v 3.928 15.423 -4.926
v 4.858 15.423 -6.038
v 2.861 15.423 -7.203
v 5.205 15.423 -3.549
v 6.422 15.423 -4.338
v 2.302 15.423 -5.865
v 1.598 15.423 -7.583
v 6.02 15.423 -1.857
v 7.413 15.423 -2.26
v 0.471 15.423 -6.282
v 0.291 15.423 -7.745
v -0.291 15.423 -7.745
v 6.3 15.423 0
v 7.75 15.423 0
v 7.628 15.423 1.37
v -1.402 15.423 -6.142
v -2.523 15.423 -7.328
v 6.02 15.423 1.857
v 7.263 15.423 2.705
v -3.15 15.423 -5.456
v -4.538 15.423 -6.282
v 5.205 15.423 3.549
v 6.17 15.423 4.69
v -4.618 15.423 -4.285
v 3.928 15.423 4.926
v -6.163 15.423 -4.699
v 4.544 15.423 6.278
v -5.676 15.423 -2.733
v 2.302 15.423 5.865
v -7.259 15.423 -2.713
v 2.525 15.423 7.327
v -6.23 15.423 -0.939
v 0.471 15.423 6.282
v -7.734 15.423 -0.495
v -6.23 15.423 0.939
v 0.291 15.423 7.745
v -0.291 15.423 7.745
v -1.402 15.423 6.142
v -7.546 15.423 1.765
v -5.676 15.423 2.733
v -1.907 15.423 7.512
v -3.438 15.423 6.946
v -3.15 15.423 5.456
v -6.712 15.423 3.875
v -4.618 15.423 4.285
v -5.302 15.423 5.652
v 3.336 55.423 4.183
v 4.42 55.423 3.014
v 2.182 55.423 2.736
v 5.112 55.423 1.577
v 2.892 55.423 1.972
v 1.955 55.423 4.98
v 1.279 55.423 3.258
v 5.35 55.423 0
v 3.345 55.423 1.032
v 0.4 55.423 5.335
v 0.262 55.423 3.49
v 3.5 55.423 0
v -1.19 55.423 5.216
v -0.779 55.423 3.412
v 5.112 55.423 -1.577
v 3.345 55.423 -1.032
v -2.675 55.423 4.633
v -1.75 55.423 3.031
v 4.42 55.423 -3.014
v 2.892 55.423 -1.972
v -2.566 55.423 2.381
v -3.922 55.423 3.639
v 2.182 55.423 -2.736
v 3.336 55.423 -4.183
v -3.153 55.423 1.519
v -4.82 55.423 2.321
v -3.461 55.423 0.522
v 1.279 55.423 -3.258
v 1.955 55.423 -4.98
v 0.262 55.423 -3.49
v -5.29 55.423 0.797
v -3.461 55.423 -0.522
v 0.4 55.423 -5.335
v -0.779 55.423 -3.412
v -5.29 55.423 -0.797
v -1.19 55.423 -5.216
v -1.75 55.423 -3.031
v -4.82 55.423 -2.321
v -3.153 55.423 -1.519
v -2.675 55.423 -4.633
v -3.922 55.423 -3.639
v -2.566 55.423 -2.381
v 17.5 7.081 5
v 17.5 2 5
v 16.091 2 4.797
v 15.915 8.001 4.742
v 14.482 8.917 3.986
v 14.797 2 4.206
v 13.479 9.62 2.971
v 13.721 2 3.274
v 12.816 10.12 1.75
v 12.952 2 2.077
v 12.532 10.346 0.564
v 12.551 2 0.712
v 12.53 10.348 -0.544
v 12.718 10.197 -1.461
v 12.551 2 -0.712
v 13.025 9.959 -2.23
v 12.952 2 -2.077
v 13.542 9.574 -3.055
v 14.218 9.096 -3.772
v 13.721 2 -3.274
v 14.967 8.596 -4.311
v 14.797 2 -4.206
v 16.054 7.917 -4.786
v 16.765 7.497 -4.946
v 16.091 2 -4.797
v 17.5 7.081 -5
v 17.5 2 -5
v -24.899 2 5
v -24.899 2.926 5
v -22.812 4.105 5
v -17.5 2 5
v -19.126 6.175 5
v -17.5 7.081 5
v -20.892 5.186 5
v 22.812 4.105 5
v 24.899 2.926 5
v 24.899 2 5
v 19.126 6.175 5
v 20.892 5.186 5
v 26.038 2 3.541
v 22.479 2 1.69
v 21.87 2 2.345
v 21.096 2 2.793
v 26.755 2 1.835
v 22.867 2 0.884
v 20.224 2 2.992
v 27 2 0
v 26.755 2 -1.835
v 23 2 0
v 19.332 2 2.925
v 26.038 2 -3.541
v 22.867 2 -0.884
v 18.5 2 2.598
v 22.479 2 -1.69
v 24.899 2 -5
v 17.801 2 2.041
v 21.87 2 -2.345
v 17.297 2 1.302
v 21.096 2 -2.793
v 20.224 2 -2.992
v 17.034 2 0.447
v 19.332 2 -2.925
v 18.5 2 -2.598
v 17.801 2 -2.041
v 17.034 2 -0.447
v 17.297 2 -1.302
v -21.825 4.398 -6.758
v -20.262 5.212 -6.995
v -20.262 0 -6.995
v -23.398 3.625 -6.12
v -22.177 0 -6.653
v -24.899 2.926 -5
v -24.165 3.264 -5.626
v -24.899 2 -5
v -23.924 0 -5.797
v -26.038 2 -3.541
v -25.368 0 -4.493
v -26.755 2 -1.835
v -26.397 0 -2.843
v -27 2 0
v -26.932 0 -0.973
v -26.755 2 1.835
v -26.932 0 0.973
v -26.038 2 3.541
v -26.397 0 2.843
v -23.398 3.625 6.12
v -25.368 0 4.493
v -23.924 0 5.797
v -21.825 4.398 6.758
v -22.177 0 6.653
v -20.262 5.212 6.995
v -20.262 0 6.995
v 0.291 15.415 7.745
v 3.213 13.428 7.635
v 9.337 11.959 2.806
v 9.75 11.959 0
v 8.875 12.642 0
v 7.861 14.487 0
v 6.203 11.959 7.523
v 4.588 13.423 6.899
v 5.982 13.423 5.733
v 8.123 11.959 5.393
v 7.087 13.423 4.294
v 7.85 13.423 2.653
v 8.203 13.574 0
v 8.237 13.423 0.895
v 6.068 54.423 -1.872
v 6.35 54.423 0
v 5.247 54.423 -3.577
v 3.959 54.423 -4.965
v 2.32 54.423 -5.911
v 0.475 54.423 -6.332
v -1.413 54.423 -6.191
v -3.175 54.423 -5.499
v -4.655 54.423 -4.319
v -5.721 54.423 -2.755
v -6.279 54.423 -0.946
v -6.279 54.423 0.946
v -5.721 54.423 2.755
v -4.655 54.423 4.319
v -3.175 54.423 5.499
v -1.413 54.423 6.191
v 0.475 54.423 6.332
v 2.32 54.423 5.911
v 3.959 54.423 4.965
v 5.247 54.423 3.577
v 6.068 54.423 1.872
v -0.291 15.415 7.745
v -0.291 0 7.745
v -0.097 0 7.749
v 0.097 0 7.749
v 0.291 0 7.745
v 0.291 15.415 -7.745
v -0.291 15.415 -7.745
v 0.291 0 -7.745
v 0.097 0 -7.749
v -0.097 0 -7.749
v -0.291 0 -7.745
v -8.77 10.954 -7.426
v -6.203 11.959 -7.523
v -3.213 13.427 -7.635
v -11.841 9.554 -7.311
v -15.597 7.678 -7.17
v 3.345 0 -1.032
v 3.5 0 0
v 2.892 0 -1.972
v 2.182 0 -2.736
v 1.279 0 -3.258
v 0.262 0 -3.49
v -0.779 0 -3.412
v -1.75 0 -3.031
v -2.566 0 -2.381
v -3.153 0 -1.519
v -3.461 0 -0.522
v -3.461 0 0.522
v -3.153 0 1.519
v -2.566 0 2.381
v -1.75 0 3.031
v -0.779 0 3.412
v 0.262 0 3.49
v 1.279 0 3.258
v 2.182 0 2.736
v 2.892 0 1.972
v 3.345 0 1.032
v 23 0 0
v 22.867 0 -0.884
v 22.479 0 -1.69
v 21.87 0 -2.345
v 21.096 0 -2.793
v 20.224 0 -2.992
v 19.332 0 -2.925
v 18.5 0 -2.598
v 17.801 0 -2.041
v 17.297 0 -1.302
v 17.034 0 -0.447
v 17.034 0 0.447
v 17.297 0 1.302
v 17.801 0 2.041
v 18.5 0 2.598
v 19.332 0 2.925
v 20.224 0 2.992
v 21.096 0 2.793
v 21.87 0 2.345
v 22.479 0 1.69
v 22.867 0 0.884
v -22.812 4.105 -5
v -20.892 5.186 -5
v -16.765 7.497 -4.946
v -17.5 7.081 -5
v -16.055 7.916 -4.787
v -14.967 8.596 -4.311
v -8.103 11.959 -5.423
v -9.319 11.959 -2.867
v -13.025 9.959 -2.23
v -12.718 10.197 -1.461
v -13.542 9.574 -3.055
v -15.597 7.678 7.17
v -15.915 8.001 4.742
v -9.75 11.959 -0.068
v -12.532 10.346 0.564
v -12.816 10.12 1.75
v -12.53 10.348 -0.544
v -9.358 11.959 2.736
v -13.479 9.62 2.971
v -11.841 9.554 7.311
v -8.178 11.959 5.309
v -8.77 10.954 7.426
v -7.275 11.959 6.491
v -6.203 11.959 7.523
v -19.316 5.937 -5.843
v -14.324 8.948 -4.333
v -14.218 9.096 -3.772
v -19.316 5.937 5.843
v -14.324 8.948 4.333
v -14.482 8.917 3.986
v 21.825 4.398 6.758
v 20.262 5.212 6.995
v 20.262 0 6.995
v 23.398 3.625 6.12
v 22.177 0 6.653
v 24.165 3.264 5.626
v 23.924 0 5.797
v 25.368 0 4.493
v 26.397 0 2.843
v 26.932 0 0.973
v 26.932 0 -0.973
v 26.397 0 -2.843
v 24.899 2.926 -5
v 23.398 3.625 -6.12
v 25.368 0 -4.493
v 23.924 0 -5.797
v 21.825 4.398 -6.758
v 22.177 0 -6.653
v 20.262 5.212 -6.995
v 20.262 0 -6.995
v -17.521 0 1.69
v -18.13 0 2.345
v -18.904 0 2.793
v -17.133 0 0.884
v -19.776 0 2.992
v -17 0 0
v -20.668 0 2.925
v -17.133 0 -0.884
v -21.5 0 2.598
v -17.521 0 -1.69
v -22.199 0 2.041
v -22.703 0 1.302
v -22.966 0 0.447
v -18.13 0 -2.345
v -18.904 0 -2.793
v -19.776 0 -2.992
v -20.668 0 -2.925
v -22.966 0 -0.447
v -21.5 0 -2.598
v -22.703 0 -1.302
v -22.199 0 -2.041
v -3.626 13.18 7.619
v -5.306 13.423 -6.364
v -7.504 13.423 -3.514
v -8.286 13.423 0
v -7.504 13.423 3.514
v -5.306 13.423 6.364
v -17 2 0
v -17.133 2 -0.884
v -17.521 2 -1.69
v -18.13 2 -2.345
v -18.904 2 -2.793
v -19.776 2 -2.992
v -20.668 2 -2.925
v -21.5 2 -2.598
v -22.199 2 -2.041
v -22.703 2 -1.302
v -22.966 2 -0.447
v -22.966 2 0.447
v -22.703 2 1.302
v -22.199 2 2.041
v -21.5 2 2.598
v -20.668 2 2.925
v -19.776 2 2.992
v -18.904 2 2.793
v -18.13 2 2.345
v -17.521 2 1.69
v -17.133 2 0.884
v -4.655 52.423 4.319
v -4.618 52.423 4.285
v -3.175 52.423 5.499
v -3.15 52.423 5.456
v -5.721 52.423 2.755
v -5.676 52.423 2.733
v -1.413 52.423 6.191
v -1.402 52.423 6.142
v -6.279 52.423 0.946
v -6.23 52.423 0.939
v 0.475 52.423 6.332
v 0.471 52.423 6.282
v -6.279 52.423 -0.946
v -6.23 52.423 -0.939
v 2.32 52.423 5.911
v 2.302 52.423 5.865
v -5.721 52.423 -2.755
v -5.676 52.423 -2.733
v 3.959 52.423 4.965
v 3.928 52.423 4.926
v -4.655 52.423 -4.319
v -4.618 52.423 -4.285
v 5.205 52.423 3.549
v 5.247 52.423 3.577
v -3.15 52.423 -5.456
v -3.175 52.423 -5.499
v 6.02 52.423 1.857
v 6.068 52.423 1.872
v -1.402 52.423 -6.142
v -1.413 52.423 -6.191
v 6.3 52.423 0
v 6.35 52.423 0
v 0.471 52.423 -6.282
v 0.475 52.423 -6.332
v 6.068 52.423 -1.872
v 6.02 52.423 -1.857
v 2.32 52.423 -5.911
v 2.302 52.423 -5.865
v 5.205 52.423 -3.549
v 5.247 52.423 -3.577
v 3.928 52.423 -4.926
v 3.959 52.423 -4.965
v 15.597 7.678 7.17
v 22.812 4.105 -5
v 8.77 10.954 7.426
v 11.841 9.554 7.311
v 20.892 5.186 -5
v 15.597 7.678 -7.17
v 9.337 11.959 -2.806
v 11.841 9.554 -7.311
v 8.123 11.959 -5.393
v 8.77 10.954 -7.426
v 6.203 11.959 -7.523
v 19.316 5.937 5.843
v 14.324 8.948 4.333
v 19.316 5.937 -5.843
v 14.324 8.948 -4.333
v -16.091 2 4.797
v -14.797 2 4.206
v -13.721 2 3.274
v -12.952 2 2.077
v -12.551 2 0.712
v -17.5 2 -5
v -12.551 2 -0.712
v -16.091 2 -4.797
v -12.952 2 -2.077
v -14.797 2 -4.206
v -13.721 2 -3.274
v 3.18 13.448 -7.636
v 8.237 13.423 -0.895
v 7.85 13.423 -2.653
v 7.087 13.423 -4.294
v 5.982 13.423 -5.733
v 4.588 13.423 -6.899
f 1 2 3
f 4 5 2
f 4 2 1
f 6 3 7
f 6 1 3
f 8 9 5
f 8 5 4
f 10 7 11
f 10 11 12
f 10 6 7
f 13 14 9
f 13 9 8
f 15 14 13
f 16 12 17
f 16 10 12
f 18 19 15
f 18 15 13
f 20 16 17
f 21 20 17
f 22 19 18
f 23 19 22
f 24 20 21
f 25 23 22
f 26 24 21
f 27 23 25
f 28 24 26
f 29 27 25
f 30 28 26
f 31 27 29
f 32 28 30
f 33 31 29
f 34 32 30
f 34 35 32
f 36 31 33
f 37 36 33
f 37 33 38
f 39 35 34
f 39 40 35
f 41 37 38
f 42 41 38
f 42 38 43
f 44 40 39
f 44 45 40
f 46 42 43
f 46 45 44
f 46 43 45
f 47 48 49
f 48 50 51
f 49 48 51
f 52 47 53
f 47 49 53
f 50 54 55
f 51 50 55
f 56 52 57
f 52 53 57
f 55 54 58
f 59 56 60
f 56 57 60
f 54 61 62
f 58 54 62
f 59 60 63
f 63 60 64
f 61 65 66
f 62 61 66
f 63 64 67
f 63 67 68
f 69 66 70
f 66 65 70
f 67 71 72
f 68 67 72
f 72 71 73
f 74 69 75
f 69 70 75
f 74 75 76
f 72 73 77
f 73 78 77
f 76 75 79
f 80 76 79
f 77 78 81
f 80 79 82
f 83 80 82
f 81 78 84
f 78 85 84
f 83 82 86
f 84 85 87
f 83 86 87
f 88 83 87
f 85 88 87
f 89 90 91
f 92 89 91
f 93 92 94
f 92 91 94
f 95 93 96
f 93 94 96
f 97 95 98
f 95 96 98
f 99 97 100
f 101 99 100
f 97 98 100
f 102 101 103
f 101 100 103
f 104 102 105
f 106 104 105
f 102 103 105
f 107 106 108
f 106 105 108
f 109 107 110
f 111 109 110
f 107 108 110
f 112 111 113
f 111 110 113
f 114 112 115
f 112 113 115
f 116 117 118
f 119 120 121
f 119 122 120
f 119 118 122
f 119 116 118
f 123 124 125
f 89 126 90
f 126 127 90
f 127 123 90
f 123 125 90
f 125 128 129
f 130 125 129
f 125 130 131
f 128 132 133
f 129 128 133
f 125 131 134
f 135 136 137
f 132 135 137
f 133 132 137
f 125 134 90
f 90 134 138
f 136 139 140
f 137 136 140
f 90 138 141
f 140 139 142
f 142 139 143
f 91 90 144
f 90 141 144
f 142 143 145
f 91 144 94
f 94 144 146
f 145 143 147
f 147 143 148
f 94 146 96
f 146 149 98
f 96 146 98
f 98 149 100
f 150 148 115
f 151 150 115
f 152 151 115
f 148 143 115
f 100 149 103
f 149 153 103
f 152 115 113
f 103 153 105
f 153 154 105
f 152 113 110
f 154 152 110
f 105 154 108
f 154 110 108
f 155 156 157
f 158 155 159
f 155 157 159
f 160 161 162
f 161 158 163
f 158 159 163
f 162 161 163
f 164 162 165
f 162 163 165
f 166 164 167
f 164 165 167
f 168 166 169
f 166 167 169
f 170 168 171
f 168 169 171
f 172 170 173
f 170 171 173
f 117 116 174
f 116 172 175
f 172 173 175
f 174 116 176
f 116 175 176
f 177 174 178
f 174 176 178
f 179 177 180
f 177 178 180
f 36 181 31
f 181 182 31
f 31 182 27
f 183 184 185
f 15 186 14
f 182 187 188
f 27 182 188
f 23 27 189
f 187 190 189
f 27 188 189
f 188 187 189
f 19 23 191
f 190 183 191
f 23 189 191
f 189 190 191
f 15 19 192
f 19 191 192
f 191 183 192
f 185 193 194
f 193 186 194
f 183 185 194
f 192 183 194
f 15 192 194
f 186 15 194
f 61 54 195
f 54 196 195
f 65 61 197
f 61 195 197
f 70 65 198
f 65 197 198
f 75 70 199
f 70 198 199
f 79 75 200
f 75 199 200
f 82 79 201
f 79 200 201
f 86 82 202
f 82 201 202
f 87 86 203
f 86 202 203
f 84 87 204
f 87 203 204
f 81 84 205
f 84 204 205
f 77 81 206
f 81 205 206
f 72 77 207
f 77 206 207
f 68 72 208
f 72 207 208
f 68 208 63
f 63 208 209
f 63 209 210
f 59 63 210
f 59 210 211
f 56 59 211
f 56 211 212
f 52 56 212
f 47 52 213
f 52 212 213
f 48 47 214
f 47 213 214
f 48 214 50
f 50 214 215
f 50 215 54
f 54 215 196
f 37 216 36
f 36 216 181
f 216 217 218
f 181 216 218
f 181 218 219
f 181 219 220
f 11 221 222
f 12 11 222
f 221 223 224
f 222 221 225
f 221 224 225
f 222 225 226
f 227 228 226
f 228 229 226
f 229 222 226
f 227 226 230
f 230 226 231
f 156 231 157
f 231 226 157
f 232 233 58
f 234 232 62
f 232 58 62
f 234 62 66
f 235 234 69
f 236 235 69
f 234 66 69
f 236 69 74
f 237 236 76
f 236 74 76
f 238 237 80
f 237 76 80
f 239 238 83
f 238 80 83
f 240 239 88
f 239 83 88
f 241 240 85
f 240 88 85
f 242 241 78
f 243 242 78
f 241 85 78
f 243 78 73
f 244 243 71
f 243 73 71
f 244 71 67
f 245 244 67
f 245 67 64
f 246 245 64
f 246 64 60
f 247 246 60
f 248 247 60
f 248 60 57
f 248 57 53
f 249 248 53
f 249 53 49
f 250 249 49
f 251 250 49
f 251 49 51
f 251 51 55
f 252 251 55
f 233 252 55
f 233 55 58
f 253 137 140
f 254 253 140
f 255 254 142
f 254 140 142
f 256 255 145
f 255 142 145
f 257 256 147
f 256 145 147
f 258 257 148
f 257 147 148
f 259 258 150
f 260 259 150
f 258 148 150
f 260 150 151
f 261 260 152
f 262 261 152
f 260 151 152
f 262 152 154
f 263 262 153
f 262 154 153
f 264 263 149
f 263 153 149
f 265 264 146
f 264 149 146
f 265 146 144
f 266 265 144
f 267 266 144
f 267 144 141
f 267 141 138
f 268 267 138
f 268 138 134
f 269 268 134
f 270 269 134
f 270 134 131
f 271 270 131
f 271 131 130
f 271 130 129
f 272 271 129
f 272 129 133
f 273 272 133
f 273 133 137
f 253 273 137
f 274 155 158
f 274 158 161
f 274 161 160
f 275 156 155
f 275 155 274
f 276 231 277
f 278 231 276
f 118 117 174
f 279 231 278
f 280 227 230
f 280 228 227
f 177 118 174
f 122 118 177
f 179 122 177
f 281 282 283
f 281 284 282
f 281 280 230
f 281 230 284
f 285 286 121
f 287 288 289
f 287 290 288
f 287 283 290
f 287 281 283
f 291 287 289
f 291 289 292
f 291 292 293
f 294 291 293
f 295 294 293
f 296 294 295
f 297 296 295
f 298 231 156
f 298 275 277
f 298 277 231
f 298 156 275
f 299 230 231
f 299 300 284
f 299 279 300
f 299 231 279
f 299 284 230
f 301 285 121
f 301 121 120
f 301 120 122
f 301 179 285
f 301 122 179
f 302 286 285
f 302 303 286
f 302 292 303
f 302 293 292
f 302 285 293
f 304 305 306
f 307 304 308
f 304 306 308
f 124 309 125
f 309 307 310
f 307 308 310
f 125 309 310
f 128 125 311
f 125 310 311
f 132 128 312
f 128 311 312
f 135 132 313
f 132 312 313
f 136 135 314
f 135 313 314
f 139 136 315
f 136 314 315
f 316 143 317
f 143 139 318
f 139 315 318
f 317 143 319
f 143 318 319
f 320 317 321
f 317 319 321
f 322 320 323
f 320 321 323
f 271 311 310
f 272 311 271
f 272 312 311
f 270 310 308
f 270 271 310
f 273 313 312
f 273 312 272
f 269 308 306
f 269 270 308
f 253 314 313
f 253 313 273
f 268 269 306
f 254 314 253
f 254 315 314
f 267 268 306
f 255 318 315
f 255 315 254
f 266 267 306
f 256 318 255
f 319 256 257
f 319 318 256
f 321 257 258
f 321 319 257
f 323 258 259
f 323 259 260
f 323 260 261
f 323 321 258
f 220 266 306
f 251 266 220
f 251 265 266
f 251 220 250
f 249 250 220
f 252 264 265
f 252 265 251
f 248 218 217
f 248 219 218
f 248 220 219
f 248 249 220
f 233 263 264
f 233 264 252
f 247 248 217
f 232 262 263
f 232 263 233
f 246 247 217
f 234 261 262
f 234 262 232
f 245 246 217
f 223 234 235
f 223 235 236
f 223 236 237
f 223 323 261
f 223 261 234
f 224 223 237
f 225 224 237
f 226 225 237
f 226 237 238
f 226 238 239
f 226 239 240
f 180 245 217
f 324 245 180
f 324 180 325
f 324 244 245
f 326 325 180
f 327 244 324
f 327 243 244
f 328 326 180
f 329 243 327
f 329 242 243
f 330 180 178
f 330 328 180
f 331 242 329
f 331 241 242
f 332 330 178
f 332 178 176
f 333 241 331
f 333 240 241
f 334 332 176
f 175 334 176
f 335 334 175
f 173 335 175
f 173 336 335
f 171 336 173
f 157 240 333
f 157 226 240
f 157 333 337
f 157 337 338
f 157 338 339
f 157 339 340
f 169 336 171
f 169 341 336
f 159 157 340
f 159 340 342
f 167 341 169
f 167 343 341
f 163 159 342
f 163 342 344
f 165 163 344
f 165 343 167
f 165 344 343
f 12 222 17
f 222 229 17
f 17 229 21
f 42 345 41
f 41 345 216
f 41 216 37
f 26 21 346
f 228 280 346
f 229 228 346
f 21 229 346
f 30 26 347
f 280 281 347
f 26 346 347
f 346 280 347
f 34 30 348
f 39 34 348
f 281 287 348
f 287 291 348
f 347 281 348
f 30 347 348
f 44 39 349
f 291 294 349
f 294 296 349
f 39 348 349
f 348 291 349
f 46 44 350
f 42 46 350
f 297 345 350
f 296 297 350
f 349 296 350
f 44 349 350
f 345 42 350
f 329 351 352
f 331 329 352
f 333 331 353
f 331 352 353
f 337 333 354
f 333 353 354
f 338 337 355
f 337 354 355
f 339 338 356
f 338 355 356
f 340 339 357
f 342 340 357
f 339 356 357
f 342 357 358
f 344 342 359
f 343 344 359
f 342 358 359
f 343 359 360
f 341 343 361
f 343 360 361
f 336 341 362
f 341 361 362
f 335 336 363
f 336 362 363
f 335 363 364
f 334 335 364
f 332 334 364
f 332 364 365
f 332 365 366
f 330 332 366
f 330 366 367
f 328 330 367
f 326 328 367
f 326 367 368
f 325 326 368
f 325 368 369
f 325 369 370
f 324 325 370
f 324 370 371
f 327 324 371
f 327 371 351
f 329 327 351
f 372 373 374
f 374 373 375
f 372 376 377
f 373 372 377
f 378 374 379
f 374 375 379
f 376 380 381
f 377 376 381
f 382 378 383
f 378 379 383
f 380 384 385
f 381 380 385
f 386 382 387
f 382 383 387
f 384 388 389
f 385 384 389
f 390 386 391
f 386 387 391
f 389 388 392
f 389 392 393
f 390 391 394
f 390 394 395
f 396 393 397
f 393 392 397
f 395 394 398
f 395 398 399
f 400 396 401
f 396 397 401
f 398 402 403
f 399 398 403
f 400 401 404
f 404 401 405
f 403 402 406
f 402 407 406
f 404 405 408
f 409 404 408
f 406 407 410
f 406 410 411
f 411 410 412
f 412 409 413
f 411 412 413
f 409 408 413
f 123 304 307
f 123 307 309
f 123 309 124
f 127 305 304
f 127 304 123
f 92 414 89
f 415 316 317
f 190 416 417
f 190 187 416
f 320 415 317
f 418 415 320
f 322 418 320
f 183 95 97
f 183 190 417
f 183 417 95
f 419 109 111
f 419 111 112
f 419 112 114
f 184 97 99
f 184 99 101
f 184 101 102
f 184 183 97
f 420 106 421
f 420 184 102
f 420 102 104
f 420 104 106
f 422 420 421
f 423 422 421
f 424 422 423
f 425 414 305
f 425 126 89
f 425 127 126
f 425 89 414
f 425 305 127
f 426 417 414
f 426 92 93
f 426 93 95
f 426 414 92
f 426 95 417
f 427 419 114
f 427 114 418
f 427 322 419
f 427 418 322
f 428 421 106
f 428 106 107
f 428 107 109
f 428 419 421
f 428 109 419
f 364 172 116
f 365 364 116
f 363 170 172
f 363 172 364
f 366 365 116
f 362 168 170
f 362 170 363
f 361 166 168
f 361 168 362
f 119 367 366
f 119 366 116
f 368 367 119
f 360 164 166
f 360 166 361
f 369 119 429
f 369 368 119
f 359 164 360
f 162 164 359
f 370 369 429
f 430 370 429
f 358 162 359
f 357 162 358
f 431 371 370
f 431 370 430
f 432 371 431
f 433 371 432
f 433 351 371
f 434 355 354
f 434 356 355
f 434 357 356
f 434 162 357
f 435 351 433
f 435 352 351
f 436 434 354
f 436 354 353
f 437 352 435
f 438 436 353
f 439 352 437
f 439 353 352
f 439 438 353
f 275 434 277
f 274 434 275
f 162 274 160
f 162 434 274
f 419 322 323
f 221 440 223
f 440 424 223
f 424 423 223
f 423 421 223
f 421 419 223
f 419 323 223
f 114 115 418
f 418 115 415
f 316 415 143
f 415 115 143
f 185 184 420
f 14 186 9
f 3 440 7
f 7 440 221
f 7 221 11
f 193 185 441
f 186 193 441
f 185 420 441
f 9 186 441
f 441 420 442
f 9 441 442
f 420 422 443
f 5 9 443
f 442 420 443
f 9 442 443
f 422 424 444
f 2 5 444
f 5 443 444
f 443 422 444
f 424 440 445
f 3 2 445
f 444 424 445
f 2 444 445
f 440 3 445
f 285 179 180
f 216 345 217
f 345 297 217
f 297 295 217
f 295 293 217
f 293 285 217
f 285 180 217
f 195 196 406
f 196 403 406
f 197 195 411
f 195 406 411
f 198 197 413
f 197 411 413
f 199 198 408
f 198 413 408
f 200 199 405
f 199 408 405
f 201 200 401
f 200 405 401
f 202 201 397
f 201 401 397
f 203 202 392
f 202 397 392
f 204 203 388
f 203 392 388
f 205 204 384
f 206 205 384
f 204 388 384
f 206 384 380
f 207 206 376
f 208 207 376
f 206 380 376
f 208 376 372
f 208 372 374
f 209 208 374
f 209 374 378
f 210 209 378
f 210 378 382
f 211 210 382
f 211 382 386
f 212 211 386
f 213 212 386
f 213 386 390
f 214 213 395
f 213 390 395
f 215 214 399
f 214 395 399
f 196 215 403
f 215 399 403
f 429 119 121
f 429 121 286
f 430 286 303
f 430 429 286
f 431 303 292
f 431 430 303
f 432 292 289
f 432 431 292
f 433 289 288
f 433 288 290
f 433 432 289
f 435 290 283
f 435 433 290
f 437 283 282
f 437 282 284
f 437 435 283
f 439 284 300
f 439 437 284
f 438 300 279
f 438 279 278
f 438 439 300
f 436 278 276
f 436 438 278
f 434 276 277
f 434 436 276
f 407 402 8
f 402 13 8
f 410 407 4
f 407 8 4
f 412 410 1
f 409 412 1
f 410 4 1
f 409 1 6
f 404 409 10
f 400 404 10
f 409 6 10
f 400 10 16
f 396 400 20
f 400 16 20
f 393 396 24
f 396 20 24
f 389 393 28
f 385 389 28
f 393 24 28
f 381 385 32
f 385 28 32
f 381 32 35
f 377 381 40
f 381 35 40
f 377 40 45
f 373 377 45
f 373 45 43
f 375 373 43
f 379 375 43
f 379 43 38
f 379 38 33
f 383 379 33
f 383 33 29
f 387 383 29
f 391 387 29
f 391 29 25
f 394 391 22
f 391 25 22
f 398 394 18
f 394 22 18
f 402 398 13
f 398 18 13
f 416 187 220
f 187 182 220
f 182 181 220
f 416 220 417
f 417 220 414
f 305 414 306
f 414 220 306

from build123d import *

# Parameters (mm, degrees)
SZKIC1_W                        = 27
SZKIC1_H                        = 25
ZAOKR_GLENIE1_R                 = 4
SZKIC4_R                        = 3
WYTNIJ_WYCI_GNI_CIE3_DEPTH      = 24.0000001
WYTNIJ_WYCI_GNI_CIE3_DEPTH_BACK = 3
WYTNIJ_WYCI_GNI_CIE2_DEPTH      = 24.0000001
SZKIC5_OUTSIDE_W                = 72.072
SZKIC5_OUTSIDE_H                = 72.072
WYTNIJ_WYCI_GNI_CIE4_DEPTH      = 26.0000001
SZKIC8_W                        = 7.75
SZKIC8_H                        = 9.576606241
SZKIC10_R                       = 3.5
WYTNIJ_WYCI_GNI_CIE5_DEPTH      = 56.423393859


with BuildPart() as part:
    # Szkic1 → Obrót1 (revolve)
    with BuildSketch(Plane.XY):
        with Locations((13.5, 12.5)):
            Rectangle(SZKIC1_W, SZKIC1_H)
    revolve(axis=Axis((0, 0, 0), (0, 1, 0)))

    # Szkic2 → Wycięcie-obrót1 (revolve, cut)
    with BuildSketch(Plane.XY):
        Polygon((27, 25), (27, 2), (7.75, 13.113992682), (7.75, 25), align=None)
    revolve(axis=Axis((0, 0, 0), (0, 1, 0)), mode=Mode.SUBTRACT)

    # Zaokrąglenie1
    zaokr_glenie1_edges = [part.edges().sort_by_distance(p)[0] for p in [
        (-7.75, 13.113992682, 0),
    ]]
    fillet(zaokr_glenie1_edges, radius=ZAOKR_GLENIE1_R)

    # Szkic4 → Wytnij-wyciągnięcie3 (cut, two sides)
    with BuildSketch(Plane(origin=(0, 2, 0), x_dir=(1, 0, 0), z_dir=(0, 1, 0))) as wytnij_wyci_gni_cie3_sk:
        with Locations((-20, 0)):
            Circle(SZKIC4_R)
        with Locations((20, 0)):
            Circle(SZKIC4_R)
    extrude(amount=WYTNIJ_WYCI_GNI_CIE3_DEPTH, mode=Mode.SUBTRACT)
    extrude(wytnij_wyci_gni_cie3_sk.sketch, amount=-WYTNIJ_WYCI_GNI_CIE3_DEPTH_BACK, mode=Mode.SUBTRACT)

    # Szkic3 → Wytnij-wyciągnięcie2 (cut, through all)
    with BuildSketch(Plane(origin=(0, 2, 0), x_dir=(1, 0, 0), z_dir=(0, 1, 0))):
        with BuildLine():
            Line((-17.5, 5), (-26.532998323, 5))
            ThreePointArc((-26.532998323, 5), (-27, 0), (-26.532998323, -5))
            Line((-26.532998323, -5), (-17.5, -5))
            ThreePointArc((-17.5, -5), (-12.5, 0), (-17.5, 5))
        make_face()
        with BuildLine():
            Line((17.5, 5), (26.532998323, 5))
            ThreePointArc((26.532998323, 5), (27, 0), (26.532998323, -5))
            Line((26.532998323, -5), (17.5, -5))
            ThreePointArc((17.5, -5), (12.5, 0), (17.5, 5))
        make_face()
    extrude(amount=WYTNIJ_WYCI_GNI_CIE2_DEPTH, mode=Mode.SUBTRACT)

    # Szkic5 outside → Wytnij-wyciągnięcie4 (cut, through all)
    with BuildSketch(Plane.XZ):
        Rectangle(SZKIC5_OUTSIDE_W, SZKIC5_OUTSIDE_H)
        with BuildLine():
            Line((-20.2625, 6.995076393), (-0.290625, 7.744548864))
            ThreePointArc((-0.290625, 7.744548864), (0, 7.75), (0.290625, 7.744548864))
            Line((0.290625, 7.744548864), (20.2625, 6.995076393))
            ThreePointArc((20.2625, 6.995076393), (27, 0), (20.2625, -6.995076393))
            Line((20.2625, -6.995076393), (0.290625, -7.744548864))
            ThreePointArc((0.290625, -7.744548864), (0, -7.75), (-0.290625, -7.744548864))
            Line((-0.290625, -7.744548864), (-20.2625, -6.995076393))
            ThreePointArc((-20.2625, -6.995076393), (-27, 0), (-20.2625, 6.995076393))
        make_face(mode=Mode.SUBTRACT)
    extrude(amount=-WYTNIJ_WYCI_GNI_CIE4_DEPTH, mode=Mode.SUBTRACT)

    # Szkic8 → Wycięcie-obrót2 (revolve, cut)
    with BuildSketch(Plane.XY):
        with Locations((3.875, 20.211696879)):
            Rectangle(SZKIC8_W, SZKIC8_H)
    revolve(axis=Axis((0, 25, 0), (0, -1, 0)), mode=Mode.SUBTRACT)

    # Szkic9 → Obrót2 (revolve)
    with BuildSketch(Plane.XY):
        Polygon((0, 15.423393759), (0, 55.423393759), (5.35, 55.423393759), (6.35, 54.423393759), (6.35, 52.423393759), (6.3, 52.423393759), (6.3, 15.423393759), align=None)
    revolve(axis=Axis((0, 15.423393759, 0), (0, 1, 0)))

    # Szkic10 → Wytnij-wyciągnięcie5 (cut, through all)
    with BuildSketch(Plane(origin=(0, 55.423393759, 0), x_dir=(1, 0, 0), z_dir=(0, 1, 0))):
        Circle(SZKIC10_R)
    extrude(amount=-WYTNIJ_WYCI_GNI_CIE5_DEPTH, mode=Mode.SUBTRACT)


solid = part.part
